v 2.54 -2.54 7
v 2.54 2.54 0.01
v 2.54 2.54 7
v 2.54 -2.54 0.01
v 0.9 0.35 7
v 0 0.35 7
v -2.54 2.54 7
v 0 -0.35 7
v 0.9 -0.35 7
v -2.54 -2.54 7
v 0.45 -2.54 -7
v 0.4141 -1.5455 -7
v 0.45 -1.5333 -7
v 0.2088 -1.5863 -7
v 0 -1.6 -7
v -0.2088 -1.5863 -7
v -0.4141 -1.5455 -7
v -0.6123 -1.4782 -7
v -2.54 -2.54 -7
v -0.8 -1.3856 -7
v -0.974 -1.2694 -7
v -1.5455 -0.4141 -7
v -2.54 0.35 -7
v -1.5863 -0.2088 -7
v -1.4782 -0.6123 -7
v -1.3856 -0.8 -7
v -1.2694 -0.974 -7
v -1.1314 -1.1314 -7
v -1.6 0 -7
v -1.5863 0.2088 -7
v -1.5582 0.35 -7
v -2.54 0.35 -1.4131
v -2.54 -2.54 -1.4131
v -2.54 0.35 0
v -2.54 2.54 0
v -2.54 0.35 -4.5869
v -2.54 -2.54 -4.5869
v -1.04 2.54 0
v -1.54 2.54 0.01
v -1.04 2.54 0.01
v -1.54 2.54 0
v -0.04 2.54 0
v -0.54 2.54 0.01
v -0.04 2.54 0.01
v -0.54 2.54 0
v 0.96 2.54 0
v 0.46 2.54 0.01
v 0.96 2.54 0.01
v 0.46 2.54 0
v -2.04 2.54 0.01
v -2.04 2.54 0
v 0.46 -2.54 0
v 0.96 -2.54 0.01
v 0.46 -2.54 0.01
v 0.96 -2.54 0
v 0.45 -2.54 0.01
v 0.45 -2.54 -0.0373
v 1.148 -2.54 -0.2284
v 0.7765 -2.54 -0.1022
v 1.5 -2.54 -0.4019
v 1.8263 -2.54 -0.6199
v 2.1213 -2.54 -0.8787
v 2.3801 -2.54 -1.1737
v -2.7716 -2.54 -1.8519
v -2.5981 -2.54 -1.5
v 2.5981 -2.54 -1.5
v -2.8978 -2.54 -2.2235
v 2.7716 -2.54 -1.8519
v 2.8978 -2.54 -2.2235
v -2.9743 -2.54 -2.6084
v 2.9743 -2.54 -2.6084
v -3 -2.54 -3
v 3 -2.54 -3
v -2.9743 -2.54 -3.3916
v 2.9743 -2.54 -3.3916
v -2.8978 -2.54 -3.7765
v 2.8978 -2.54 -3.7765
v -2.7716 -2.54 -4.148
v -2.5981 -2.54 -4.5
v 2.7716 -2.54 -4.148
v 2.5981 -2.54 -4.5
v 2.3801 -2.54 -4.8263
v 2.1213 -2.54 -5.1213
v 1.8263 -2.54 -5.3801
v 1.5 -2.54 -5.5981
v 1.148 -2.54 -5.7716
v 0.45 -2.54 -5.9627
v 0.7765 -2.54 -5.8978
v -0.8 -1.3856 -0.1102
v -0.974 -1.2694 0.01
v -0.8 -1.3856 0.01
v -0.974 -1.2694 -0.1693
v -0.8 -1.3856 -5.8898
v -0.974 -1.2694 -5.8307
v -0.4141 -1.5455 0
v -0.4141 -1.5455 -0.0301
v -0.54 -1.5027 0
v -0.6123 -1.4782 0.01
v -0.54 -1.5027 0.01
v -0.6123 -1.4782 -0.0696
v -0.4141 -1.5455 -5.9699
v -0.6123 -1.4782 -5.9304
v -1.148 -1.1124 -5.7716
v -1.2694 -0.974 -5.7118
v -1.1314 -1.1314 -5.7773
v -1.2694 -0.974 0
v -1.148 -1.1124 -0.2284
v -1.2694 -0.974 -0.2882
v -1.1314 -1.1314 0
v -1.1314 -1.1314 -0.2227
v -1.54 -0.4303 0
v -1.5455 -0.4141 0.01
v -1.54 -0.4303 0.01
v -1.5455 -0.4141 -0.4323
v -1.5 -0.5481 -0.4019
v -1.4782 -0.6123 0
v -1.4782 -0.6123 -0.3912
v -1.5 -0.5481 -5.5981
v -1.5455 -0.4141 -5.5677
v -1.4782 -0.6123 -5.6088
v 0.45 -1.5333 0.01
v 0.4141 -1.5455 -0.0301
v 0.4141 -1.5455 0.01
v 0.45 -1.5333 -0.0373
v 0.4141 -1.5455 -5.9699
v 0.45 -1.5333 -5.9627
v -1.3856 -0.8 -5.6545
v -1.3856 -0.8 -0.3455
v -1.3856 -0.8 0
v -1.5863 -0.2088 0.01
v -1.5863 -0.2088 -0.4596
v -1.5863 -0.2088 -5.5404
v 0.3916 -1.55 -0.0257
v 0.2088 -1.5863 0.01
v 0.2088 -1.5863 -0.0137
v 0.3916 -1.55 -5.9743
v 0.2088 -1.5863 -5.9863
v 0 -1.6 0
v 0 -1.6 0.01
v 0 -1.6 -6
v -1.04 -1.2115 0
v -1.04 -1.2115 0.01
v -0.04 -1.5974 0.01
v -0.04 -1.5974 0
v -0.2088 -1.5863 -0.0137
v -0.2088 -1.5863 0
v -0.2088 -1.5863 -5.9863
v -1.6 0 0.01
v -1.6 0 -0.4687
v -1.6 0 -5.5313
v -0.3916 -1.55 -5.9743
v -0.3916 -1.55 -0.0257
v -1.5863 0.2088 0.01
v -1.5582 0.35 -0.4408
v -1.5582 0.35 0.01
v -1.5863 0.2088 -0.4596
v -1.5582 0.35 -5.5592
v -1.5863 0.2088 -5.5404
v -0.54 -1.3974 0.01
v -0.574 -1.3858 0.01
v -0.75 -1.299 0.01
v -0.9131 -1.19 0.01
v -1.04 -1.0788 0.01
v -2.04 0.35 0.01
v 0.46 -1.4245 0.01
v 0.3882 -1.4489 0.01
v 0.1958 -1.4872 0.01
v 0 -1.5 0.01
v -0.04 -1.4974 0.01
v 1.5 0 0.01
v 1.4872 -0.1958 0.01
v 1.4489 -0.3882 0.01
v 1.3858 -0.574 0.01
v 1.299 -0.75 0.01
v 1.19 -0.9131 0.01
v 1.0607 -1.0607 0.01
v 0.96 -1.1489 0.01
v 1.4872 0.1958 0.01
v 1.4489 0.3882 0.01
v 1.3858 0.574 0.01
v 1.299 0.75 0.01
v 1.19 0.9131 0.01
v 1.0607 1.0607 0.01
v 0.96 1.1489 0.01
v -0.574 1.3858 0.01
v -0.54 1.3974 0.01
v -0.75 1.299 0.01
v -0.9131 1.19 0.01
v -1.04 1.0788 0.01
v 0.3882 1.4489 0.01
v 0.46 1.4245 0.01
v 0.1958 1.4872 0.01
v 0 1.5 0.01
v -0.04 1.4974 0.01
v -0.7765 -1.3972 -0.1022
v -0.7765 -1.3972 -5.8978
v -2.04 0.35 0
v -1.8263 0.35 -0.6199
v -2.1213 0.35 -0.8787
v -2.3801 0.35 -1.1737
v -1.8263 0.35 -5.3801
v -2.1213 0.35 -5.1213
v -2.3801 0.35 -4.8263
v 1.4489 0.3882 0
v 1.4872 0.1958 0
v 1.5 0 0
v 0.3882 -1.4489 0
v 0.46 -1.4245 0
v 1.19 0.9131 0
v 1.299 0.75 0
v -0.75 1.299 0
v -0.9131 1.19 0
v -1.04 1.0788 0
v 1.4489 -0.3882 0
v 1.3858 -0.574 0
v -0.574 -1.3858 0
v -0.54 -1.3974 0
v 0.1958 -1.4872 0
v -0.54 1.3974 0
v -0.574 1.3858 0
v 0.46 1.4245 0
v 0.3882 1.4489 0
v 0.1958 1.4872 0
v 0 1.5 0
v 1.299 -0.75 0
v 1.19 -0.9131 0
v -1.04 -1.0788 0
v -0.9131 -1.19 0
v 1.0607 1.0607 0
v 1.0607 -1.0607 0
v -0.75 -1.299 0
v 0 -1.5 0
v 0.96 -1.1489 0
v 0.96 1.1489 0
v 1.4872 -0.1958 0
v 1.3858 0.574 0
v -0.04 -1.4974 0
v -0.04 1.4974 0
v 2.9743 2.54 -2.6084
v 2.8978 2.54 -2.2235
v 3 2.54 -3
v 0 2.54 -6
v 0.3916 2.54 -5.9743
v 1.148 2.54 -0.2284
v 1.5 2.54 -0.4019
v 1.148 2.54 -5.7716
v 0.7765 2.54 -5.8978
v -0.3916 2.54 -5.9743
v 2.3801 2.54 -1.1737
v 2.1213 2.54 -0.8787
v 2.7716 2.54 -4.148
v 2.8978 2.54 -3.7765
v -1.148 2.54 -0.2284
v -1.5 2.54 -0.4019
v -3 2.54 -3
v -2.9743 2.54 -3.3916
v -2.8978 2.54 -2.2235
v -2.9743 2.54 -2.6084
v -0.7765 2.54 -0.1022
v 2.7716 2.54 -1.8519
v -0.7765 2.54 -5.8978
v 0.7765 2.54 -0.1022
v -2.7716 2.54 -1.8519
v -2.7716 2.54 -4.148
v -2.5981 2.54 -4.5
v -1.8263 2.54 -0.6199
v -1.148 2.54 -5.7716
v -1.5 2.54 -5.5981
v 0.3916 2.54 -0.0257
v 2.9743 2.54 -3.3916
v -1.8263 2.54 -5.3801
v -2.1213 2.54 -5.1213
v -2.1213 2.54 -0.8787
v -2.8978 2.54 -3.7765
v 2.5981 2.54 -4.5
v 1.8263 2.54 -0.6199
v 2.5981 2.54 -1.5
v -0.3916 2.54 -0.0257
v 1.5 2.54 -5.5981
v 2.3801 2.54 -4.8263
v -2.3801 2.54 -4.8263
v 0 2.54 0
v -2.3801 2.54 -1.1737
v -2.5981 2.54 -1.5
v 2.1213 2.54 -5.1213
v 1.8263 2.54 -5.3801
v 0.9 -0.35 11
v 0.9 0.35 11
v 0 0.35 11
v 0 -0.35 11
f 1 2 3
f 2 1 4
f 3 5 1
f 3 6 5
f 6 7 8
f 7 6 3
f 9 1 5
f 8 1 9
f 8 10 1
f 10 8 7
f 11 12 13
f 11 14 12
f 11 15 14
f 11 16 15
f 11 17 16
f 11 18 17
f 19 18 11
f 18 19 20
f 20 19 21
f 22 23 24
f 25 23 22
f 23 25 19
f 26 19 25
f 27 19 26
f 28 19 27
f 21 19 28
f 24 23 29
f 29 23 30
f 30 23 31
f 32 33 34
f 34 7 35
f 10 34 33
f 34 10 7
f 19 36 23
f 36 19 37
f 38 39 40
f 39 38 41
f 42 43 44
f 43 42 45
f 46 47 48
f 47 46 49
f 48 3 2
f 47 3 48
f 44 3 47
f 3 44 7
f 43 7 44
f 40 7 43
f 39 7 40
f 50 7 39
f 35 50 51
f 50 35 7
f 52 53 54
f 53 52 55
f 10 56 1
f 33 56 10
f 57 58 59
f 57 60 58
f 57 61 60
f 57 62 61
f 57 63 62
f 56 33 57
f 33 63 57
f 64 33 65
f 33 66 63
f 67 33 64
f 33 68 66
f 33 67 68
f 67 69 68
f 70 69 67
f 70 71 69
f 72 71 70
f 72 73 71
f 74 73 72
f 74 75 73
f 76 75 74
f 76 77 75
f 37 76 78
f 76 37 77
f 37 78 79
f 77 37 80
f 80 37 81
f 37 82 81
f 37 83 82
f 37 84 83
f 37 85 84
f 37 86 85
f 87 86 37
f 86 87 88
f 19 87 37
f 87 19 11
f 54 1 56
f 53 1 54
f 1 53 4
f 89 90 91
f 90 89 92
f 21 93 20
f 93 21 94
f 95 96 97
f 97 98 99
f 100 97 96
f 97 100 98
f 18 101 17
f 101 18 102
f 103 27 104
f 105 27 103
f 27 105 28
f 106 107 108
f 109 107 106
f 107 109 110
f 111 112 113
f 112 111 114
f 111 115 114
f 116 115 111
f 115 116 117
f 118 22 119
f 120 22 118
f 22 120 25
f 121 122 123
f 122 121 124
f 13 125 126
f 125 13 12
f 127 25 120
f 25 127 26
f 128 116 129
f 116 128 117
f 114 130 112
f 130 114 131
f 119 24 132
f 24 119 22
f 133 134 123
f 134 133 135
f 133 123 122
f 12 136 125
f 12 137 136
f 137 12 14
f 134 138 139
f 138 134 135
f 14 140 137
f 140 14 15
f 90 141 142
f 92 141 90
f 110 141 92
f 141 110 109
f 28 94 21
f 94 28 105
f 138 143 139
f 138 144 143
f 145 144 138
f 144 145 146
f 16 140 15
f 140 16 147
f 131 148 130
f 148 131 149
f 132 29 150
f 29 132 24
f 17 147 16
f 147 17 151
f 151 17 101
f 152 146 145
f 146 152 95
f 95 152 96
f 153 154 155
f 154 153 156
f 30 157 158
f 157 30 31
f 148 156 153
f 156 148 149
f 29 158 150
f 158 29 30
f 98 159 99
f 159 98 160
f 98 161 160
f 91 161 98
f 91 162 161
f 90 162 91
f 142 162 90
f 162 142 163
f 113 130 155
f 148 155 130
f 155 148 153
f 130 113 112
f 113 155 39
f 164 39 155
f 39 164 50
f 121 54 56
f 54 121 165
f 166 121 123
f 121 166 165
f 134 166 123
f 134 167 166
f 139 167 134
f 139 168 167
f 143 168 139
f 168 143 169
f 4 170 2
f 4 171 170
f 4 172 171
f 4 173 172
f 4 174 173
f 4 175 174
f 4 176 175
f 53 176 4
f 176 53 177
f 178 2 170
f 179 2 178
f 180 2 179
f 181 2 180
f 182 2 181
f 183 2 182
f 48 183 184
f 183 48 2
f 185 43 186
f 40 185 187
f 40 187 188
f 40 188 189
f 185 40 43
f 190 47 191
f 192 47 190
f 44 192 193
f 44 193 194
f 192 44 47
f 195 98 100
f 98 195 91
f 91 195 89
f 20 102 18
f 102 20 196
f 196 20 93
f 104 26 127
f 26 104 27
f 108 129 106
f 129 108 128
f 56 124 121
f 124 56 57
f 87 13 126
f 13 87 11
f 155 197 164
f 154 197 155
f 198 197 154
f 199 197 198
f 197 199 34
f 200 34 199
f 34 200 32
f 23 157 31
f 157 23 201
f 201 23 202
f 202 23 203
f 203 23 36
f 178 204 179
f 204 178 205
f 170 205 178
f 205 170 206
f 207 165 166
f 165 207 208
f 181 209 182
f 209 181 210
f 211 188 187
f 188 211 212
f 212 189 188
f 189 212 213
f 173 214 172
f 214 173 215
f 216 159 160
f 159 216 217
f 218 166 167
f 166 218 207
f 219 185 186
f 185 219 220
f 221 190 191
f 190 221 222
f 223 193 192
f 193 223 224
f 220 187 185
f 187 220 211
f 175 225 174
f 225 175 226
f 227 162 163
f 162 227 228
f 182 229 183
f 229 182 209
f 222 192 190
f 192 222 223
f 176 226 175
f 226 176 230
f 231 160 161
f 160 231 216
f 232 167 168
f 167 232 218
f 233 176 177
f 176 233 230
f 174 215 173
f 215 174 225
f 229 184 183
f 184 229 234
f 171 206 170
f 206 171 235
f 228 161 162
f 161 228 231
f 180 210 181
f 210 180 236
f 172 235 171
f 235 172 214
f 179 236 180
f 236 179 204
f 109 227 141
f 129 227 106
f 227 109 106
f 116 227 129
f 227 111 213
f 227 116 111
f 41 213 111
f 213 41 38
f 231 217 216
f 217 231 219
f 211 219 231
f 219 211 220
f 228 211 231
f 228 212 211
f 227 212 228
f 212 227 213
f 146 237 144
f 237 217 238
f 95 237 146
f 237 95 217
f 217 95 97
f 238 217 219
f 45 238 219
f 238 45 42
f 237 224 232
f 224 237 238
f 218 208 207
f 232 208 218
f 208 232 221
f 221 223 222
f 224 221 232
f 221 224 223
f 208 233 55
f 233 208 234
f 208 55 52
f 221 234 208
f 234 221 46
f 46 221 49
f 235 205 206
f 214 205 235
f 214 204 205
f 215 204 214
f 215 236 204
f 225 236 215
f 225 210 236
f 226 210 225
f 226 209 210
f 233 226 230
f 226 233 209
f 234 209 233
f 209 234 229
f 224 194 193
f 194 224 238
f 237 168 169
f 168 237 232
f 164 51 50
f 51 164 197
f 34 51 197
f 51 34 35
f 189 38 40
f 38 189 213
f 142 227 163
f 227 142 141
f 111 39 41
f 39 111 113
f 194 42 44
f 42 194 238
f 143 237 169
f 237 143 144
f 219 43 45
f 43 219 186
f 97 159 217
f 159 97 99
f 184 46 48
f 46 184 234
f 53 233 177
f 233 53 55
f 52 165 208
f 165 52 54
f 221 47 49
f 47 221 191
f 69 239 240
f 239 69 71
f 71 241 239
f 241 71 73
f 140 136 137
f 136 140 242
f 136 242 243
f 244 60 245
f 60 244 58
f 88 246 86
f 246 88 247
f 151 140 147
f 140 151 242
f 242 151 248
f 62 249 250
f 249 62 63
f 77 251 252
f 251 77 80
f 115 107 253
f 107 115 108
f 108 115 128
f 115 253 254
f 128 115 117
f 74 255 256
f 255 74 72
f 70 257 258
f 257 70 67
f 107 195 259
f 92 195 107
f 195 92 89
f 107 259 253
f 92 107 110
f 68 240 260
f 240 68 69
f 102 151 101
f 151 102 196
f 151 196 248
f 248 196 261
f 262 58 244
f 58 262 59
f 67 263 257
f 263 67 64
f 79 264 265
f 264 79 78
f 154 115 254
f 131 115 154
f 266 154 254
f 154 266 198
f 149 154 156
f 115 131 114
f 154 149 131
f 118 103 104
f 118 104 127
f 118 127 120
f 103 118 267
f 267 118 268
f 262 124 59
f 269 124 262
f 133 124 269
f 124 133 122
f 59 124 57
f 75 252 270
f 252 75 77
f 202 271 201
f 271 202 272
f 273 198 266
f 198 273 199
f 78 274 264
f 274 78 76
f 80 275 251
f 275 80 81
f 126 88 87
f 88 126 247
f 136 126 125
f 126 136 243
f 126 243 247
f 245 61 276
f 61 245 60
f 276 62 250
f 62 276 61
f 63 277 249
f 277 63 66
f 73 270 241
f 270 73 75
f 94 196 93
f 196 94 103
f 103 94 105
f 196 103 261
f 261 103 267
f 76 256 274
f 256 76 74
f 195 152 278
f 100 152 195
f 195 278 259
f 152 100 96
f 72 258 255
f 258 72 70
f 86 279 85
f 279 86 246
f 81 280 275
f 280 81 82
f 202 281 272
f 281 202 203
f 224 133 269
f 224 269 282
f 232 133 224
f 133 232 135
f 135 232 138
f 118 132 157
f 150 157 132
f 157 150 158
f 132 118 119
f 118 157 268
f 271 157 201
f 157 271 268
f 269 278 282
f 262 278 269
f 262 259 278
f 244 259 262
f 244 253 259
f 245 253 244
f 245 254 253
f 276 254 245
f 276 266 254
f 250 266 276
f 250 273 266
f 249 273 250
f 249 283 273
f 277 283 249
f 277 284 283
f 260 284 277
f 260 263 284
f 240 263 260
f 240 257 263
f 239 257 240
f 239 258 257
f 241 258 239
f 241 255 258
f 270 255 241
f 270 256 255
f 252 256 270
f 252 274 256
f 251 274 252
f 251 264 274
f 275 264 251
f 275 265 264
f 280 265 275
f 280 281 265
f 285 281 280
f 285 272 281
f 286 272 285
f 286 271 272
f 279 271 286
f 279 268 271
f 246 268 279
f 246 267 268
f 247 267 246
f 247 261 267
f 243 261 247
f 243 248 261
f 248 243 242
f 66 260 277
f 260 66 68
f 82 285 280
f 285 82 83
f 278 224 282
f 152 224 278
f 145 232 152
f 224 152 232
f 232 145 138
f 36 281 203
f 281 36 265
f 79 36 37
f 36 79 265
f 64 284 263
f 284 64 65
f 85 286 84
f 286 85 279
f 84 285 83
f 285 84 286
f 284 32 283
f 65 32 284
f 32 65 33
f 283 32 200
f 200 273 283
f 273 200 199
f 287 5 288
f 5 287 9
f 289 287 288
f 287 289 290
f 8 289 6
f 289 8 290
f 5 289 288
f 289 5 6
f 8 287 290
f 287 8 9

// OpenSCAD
// DND-54 S5-R register unit cell -- CAD evidence for the dropout latch.
//
// This is a SINGLE-COLUMN unit cell of the shared-drive programmable rotary
// register (the S5-R pivot). It is NOT a full machine and NOT a print. Its job
// is to let the analytic printability gate read the declared feature sizes and
// to let a real OpenSCAD render + mesh-validate that the latch + rotor bank
// geometry is a closed solid at the 5.08 mm pitch.
//
// The constants below are the source of truth parsed by
// tools/validate/analytic_printability.py and recomputed by s5r_register.py.
// Keep the two in sync.
//
// EVIDENCE CLASS: CAD (this file + its STL render). Not a print, not a
// measurement. See 07-evidence-and-decisions/dnd54-s5r-register-latch.md.
//
// Units: mm. Target process: Bambu X1C, PLA, 0.4 mm nozzle (tools/fdm-limits).

// ---- cell / rotor (unchanged S5 geometry, test08 parameters.scad) ----
PITCH = 5.08;
ROTOR_RADIUS = 1.5;
ROTOR_CORE_RADIUS = 1.0;
BASE = 2.0;
LEVELS = 5;
LEVEL_ANGLE = 360 / LEVELS;     // 72 deg

// ---- printed drive pawl (vertical cantilever, load-bearing = 2 lines) ----
PAWL_T = 0.90;                  // thickness in X (pitch direction); 2 lines
PAWL_W = 0.70;                  // width in Y (row direction)
PAWL_LEN = 8.00;                // Z extent of the cantilever
PAWL_DEFLECT = 0.10;            // working deflection off the rack tooth

// ---- keeper latch (bistable over-centre leaf, 5-position gate) ----
// DND-59 re-profile (R-DND54-KEEPER): 0.45 (1 line, RISK) -> 0.90 mm (2 lines,
// PASS); the HOLD is a hard printed shoulder in compression, so the leaf only
// trips the snap. A longer leaf (4.00) keeps the snap strain low.
KEEPER_T = 0.90;                // thickness in X (2 lines; PASS)
KEEPER_W = 0.70;                // width in Y
KEEPER_LEN = 4.00;              // Z cantilever
KEEPER_OVER_CENTRE = 0.06;      // bistability offset (snap trip only)
KEEPER_GATE_STEP = 0.35;        // spacing of the 5 gate positions
KEEPER_SHOULDER_X = 0.50;       // hard shoulder depth in X (hold, compression)

// ---- shared drive bar with rack ----
// DND-58 (from DND-55 bank close-out): DND-54's rack (pitch 0.60, tooth 0.45)
// left a 0.15 mm inter-tooth gap that FUSES at a 0.4 mm nozzle (< 0.44 mm line).
// Re-dimensioned to pitch 1.00 / tooth 0.50 -> 0.50 mm gap. The per-stroke
// advance is therefore 1.00 mm (one tooth) instead of 0.60 mm.
RACK_TOOTH_PITCH = 1.00;
RACK_TOOTH_HEIGHT = 0.50;
BAR_D = 6.0;                    // sourced steel drive rod d=6 (DND-58); a round bar
BAR_H = BAR_D;                  // (round steel; replaces the 3x2 printed placeholder)
BAR_W = PITCH;                  // bar spans one column here; real bar is 80xR

// ---- housing ----
CELL_H = 7.0;
WALL = 0.90;                    // robust infill-free wall (>= 2 lines)
SLOT_CLEAR = 0.15;              // guide clearance (worst case >= 0.20 after print)
ROTOR_BORE_CLEAR = 0.40;        // total diametral rotor-to-bore free play

$fn = 48;
EPS = 0.01;

module rotor() {
    cylinder(r = ROTOR_RADIUS, h = BASE);
    translate([0, 0, BASE]) cylinder(r = ROTOR_CORE_RADIUS, h = CELL_H - BASE);
}

module pawl() {
    // a thin vertical leaf, attached to the hub at its top, tip down at the rack
    translate([0, -PAWL_W / 2, 0]) cube([PAWL_T, PAWL_W, PAWL_LEN]);
}

module keeper() {
    // DND-59: the keeper leaf is re-profiled into the ROW (Y) direction, beside
    // the pawl, so it does not consume the pitch-direction (X) band. Its
    // thickness in Y is KEEPER_T (2 lines, 0.90).
    translate([0, PAWL_W + KEEPER_OVER_CENTRE, 0])
        cube([KEEPER_T, KEEPER_T, KEEPER_LEN]);
    // gate nose: 5 stacked positions (the writer moves the keeper index)
    for (k = [0:LEVELS - 1])
        translate([0, PAWL_W + KEEPER_OVER_CENTRE + KEEPER_T,
                   k * KEEPER_GATE_STEP])
            cube([KEEPER_T, 0.20, 0.15]);
    // hard printed shoulder: takes the pawl push-out in COMPRESSION when the
    // keeper is dropped out (the hold does not depend on the over-centre offset)
    translate([0, PAWL_W + KEEPER_OVER_CENTRE, -KEEPER_SHOULDER_X])
        cube([KEEPER_T, KEEPER_SHOULDER_X, KEEPER_SHOULDER_X]);
}

module drive_bar() {
    // the toothed rack under the pawl tip. DND-58: the bar is a SOURCED STEEL
    // ROD (d=6 mm), modelled here as the round bar body; the rack teeth are the
    // corrected 1.00/0.50 pitch/height.
    translate([0, 0, -BAR_H / 2]) rotate([90, 0, 0])
        cylinder(r = BAR_D / 2, h = BAR_W, center = true);
    for (t = [0:3])
        translate([-BAR_W / 2 + t * RACK_TOOTH_PITCH, -BAR_W / 2, 0])
            cube([RACK_TOOTH_HEIGHT, BAR_W, RACK_TOOTH_HEIGHT]);
}

module cell() {
    // housing: a square tube with a floor, open toward +Z for the rotor
    difference() {
        translate([-PITCH / 2, -PITCH / 2, -BAR_H - 1])
            cube([PITCH, PITCH, CELL_H + BAR_H + 1]);
        // rotor bore
        translate([0, 0, -BAR_H - 1 - EPS]) cylinder(r = ROTOR_RADIUS + 0.10,
                                                     h = CELL_H + 2 * EPS);
        // pawl side chamber (open slot, +X)
        translate([PAWL_T / 2, -PITCH / 2 - EPS, -BAR_H - 1 - EPS])
            cube([PITCH / 2, PITCH + 2 * EPS, CELL_H + 2 * EPS]);
        // keeper side chamber (open slot, +Y; DND-59 keeper moved to the row
        // direction so it does not consume the pitch-direction band)
        translate([-PITCH / 2 - EPS, PAWL_W / 2, -BAR_H - 1 - EPS])
            cube([PITCH + 2 * EPS, PITCH / 2, CELL_H + 2 * EPS]);
    }
}

module unit_cell_assembly() {
    cell();
    rotor();
    translate([0, 0, BASE + 1]) pawl();
    translate([0, 0, BASE + 1]) keeper();
    drive_bar();
}

// part = "cell" | "assembly" | "pawl" | "keeper";
part = "assembly";

if (part == "assembly") {
    unit_cell_assembly();
} else if (part == "cell") {
    cell();
} else if (part == "pawl") {
    pawl();
} else if (part == "keeper") {
    keeper();
}
